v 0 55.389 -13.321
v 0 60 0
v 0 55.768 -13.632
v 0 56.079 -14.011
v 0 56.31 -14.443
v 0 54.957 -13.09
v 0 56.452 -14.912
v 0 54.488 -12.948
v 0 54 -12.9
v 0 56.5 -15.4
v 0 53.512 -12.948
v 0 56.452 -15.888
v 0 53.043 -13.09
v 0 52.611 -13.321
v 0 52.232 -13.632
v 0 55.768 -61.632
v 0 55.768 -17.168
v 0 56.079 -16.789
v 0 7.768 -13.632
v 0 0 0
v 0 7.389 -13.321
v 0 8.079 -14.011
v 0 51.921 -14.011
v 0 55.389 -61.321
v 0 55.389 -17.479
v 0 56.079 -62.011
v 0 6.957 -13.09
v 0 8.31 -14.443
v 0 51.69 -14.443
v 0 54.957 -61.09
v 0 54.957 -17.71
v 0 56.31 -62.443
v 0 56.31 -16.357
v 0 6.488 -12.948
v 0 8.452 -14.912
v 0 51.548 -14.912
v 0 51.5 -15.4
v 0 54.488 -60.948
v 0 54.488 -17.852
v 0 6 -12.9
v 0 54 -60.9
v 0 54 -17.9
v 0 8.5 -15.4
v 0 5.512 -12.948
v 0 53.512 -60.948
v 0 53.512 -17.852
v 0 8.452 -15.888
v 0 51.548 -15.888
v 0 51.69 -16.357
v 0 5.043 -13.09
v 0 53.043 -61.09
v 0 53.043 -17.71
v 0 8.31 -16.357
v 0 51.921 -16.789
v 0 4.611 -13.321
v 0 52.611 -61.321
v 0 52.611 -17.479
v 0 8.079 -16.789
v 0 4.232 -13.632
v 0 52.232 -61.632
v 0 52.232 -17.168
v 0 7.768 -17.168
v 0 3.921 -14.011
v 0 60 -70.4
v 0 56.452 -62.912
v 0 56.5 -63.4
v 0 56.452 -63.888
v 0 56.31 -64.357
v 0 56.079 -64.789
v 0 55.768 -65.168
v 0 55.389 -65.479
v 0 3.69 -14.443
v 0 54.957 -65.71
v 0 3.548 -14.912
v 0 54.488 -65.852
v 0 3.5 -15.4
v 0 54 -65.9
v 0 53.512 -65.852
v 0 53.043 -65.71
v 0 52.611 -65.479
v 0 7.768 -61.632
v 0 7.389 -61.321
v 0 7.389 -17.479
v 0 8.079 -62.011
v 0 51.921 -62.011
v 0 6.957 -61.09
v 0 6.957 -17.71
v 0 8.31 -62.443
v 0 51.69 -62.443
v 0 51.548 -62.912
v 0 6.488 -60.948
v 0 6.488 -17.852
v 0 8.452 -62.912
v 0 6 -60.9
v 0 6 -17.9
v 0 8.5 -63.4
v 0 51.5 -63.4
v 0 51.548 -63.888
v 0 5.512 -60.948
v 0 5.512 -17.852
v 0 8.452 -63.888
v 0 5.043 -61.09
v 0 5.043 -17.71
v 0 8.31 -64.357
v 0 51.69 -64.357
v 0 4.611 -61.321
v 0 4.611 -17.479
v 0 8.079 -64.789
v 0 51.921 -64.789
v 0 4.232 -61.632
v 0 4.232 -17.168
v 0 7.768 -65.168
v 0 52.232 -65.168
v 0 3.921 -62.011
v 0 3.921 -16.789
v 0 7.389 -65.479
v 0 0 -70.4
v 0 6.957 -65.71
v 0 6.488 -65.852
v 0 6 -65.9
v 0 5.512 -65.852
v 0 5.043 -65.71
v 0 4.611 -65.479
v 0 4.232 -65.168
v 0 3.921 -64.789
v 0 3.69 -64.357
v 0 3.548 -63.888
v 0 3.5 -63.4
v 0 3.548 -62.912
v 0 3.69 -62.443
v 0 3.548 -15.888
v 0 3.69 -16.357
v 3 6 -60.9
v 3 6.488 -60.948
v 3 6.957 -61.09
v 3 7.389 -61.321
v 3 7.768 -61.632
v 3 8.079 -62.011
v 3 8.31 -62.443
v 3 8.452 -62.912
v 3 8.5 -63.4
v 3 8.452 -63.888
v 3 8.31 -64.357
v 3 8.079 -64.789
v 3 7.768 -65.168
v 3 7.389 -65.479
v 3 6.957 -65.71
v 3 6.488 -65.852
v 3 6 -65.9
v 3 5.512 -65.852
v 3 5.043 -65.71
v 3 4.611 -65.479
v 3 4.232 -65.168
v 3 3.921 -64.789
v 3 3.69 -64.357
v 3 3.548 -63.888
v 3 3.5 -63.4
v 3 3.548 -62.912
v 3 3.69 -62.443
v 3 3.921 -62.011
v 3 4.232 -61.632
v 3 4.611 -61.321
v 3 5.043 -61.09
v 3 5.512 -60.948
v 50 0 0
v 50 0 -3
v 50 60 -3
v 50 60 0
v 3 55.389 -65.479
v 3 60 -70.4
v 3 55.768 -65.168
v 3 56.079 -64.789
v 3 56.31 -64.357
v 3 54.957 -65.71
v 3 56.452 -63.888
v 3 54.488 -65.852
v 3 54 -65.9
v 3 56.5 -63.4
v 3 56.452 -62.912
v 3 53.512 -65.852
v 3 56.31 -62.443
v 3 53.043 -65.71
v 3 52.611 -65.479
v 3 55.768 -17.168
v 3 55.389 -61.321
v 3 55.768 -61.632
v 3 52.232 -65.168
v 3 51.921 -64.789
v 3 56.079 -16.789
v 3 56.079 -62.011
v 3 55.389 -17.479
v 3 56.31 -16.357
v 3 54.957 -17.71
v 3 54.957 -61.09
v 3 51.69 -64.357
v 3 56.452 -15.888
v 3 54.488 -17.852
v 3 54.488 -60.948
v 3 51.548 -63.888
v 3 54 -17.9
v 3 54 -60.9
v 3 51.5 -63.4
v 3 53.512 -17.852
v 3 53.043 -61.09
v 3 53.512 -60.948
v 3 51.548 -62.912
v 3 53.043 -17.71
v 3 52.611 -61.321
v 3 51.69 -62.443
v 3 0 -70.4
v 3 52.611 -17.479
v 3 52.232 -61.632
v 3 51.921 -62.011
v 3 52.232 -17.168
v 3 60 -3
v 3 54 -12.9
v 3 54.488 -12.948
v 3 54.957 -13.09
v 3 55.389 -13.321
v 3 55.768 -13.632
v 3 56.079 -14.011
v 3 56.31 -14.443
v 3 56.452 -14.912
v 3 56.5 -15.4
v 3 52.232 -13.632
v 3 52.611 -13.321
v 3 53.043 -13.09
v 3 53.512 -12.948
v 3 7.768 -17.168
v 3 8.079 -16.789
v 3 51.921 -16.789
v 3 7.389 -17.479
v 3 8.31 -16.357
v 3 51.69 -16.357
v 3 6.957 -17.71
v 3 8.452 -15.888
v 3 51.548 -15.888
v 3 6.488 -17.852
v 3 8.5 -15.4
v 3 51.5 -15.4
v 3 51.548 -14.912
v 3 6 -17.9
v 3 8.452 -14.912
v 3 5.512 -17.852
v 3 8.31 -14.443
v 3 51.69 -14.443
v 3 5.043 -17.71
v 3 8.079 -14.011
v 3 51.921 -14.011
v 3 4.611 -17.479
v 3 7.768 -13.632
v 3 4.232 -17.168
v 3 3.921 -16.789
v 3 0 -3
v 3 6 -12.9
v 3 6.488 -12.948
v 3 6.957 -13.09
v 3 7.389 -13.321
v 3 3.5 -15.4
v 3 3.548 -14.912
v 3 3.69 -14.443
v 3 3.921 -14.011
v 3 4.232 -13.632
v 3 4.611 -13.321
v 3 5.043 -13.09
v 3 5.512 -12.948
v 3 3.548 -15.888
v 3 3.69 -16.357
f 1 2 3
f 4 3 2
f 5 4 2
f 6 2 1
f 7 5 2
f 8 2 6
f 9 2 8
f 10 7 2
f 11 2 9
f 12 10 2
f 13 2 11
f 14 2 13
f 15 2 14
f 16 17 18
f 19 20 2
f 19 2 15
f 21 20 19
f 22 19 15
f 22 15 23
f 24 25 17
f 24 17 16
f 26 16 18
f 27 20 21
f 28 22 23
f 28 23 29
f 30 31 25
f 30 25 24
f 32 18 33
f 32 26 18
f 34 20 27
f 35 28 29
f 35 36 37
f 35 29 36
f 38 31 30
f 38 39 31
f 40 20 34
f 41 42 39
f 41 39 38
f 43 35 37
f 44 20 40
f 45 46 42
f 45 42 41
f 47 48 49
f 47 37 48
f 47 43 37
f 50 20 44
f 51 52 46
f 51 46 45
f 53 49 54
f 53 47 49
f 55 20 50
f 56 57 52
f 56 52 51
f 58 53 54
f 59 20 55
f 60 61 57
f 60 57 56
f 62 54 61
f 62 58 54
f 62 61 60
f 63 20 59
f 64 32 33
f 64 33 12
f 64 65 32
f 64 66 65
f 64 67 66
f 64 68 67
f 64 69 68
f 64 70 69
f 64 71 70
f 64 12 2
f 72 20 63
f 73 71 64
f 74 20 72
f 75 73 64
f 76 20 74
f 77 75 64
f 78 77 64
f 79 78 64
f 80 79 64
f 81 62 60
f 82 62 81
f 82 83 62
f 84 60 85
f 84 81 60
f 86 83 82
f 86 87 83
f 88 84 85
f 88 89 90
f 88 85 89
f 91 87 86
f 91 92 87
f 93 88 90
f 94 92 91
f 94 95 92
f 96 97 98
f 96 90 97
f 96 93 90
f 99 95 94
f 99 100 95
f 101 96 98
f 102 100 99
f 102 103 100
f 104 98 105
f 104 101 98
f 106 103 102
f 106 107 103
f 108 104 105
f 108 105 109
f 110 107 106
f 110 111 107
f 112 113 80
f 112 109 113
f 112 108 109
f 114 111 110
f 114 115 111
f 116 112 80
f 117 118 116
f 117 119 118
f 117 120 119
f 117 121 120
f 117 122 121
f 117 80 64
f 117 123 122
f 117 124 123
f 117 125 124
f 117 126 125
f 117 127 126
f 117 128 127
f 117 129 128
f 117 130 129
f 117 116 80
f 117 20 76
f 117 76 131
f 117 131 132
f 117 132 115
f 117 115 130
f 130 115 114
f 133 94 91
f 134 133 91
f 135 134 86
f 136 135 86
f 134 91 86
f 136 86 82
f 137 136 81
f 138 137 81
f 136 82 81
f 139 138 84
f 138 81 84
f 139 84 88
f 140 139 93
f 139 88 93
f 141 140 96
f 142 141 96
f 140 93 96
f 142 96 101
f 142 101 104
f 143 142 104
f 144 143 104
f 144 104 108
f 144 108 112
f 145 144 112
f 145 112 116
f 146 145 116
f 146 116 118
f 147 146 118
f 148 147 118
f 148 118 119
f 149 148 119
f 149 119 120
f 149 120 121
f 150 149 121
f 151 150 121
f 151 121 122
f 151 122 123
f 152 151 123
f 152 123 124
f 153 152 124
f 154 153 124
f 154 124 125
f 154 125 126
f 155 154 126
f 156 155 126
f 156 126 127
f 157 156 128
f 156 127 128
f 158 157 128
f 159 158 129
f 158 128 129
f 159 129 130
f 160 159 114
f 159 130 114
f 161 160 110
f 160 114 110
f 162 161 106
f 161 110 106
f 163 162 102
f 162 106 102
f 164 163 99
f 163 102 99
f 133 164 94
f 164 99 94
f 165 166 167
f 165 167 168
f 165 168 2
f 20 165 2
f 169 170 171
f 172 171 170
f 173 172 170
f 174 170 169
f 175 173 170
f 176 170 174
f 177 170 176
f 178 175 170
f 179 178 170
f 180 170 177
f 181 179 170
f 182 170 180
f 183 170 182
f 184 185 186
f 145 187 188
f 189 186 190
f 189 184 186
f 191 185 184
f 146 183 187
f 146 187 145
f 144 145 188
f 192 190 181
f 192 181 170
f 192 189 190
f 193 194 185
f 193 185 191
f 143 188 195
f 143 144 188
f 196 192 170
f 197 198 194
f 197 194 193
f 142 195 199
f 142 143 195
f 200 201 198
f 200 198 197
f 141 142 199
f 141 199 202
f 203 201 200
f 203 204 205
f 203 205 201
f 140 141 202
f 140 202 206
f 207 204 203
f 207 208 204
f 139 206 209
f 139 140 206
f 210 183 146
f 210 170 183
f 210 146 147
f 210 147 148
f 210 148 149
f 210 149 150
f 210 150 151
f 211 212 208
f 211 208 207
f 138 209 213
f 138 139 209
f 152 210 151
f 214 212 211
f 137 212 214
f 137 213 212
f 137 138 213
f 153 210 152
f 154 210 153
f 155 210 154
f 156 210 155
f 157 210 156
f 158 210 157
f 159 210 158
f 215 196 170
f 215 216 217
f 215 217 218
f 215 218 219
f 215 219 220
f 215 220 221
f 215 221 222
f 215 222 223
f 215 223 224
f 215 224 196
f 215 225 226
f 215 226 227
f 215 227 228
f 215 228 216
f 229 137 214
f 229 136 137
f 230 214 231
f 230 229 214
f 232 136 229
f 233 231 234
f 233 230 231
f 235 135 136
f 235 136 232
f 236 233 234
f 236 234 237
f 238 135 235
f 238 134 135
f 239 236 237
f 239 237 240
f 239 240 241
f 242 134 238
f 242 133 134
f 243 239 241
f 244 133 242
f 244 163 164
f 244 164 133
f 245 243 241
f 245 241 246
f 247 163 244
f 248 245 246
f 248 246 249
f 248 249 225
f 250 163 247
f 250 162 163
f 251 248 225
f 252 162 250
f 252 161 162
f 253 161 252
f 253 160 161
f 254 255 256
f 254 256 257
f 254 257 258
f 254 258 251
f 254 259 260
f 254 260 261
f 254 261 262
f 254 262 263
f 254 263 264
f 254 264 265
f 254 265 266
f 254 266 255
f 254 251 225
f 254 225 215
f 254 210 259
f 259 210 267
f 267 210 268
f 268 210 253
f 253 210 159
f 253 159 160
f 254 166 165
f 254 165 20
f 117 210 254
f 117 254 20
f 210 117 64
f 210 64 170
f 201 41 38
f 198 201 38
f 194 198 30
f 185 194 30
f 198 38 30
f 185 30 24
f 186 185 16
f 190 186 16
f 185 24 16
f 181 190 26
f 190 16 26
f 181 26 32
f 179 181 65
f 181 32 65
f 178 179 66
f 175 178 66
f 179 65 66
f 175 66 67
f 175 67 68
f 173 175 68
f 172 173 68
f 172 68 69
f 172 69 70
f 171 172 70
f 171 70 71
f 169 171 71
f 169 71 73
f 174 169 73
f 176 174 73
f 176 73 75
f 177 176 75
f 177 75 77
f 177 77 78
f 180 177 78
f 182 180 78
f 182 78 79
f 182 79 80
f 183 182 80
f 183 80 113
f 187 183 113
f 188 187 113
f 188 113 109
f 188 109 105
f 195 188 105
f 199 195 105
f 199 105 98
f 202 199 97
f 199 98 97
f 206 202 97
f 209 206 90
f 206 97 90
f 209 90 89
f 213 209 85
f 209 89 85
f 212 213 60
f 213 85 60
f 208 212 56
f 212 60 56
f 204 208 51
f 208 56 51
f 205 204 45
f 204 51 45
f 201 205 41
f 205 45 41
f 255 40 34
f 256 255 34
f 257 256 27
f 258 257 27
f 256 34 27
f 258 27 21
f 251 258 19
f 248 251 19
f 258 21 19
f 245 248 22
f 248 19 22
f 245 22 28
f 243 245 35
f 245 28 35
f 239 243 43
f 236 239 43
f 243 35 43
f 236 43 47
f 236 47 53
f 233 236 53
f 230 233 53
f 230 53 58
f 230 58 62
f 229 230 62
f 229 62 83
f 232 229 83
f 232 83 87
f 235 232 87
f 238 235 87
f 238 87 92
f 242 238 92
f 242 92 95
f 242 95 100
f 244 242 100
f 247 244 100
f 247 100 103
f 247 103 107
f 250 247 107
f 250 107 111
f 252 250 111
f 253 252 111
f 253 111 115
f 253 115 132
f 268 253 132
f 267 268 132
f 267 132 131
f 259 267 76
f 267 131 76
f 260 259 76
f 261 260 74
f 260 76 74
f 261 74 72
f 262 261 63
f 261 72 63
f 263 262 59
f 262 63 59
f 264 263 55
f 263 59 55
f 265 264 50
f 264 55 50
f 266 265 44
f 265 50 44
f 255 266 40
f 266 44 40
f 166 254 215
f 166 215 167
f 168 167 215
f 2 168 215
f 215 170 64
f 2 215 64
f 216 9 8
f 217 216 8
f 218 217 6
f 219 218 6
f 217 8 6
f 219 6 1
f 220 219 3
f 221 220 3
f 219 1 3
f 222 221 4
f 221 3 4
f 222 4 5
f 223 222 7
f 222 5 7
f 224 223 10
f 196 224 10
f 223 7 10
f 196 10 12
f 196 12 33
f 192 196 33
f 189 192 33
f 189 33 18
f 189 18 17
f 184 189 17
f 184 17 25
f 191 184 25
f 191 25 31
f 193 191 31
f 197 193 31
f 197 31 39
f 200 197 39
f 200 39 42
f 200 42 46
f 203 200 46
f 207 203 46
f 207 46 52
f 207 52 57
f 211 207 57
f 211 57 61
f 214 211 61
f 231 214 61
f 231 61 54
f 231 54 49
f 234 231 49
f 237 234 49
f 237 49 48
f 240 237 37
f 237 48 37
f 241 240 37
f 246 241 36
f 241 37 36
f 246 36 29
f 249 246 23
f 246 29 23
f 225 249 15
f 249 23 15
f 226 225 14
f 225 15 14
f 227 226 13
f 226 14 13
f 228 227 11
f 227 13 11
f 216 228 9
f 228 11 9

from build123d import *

# Parameters (mm, degrees)
BOSS_EXTRUDE1_DEPTH = 60
SKETCH2_R           = 2.5
CUT_EXTRUDE1_DEPTH  = 106.148276258


with BuildPart() as part:
    # Sketch1 → Boss-Extrude1 (new body)
    with BuildSketch(Plane(origin=(0, 0, 0), x_dir=(1, 0, 0), z_dir=(0, 1, 0))):
        Polygon((0, 0), (0, 70.4), (3, 70.4), (3, 3), (50, 3), (50, 0), align=None)
    extrude(amount=BOSS_EXTRUDE1_DEPTH)

    # Sketch2 → Cut-Extrude1 (cut, through all)
    with BuildSketch(Plane.ZY):
        with Locations((-63.4, 6)):
            Circle(SKETCH2_R)
        with Locations((-15.4, 6)):
            Circle(SKETCH2_R)
        with Locations((-15.4, 54)):
            Circle(SKETCH2_R)
        with Locations((-63.4, 54)):
            Circle(SKETCH2_R)
    extrude(amount=-CUT_EXTRUDE1_DEPTH, mode=Mode.SUBTRACT)


solid = part.part
